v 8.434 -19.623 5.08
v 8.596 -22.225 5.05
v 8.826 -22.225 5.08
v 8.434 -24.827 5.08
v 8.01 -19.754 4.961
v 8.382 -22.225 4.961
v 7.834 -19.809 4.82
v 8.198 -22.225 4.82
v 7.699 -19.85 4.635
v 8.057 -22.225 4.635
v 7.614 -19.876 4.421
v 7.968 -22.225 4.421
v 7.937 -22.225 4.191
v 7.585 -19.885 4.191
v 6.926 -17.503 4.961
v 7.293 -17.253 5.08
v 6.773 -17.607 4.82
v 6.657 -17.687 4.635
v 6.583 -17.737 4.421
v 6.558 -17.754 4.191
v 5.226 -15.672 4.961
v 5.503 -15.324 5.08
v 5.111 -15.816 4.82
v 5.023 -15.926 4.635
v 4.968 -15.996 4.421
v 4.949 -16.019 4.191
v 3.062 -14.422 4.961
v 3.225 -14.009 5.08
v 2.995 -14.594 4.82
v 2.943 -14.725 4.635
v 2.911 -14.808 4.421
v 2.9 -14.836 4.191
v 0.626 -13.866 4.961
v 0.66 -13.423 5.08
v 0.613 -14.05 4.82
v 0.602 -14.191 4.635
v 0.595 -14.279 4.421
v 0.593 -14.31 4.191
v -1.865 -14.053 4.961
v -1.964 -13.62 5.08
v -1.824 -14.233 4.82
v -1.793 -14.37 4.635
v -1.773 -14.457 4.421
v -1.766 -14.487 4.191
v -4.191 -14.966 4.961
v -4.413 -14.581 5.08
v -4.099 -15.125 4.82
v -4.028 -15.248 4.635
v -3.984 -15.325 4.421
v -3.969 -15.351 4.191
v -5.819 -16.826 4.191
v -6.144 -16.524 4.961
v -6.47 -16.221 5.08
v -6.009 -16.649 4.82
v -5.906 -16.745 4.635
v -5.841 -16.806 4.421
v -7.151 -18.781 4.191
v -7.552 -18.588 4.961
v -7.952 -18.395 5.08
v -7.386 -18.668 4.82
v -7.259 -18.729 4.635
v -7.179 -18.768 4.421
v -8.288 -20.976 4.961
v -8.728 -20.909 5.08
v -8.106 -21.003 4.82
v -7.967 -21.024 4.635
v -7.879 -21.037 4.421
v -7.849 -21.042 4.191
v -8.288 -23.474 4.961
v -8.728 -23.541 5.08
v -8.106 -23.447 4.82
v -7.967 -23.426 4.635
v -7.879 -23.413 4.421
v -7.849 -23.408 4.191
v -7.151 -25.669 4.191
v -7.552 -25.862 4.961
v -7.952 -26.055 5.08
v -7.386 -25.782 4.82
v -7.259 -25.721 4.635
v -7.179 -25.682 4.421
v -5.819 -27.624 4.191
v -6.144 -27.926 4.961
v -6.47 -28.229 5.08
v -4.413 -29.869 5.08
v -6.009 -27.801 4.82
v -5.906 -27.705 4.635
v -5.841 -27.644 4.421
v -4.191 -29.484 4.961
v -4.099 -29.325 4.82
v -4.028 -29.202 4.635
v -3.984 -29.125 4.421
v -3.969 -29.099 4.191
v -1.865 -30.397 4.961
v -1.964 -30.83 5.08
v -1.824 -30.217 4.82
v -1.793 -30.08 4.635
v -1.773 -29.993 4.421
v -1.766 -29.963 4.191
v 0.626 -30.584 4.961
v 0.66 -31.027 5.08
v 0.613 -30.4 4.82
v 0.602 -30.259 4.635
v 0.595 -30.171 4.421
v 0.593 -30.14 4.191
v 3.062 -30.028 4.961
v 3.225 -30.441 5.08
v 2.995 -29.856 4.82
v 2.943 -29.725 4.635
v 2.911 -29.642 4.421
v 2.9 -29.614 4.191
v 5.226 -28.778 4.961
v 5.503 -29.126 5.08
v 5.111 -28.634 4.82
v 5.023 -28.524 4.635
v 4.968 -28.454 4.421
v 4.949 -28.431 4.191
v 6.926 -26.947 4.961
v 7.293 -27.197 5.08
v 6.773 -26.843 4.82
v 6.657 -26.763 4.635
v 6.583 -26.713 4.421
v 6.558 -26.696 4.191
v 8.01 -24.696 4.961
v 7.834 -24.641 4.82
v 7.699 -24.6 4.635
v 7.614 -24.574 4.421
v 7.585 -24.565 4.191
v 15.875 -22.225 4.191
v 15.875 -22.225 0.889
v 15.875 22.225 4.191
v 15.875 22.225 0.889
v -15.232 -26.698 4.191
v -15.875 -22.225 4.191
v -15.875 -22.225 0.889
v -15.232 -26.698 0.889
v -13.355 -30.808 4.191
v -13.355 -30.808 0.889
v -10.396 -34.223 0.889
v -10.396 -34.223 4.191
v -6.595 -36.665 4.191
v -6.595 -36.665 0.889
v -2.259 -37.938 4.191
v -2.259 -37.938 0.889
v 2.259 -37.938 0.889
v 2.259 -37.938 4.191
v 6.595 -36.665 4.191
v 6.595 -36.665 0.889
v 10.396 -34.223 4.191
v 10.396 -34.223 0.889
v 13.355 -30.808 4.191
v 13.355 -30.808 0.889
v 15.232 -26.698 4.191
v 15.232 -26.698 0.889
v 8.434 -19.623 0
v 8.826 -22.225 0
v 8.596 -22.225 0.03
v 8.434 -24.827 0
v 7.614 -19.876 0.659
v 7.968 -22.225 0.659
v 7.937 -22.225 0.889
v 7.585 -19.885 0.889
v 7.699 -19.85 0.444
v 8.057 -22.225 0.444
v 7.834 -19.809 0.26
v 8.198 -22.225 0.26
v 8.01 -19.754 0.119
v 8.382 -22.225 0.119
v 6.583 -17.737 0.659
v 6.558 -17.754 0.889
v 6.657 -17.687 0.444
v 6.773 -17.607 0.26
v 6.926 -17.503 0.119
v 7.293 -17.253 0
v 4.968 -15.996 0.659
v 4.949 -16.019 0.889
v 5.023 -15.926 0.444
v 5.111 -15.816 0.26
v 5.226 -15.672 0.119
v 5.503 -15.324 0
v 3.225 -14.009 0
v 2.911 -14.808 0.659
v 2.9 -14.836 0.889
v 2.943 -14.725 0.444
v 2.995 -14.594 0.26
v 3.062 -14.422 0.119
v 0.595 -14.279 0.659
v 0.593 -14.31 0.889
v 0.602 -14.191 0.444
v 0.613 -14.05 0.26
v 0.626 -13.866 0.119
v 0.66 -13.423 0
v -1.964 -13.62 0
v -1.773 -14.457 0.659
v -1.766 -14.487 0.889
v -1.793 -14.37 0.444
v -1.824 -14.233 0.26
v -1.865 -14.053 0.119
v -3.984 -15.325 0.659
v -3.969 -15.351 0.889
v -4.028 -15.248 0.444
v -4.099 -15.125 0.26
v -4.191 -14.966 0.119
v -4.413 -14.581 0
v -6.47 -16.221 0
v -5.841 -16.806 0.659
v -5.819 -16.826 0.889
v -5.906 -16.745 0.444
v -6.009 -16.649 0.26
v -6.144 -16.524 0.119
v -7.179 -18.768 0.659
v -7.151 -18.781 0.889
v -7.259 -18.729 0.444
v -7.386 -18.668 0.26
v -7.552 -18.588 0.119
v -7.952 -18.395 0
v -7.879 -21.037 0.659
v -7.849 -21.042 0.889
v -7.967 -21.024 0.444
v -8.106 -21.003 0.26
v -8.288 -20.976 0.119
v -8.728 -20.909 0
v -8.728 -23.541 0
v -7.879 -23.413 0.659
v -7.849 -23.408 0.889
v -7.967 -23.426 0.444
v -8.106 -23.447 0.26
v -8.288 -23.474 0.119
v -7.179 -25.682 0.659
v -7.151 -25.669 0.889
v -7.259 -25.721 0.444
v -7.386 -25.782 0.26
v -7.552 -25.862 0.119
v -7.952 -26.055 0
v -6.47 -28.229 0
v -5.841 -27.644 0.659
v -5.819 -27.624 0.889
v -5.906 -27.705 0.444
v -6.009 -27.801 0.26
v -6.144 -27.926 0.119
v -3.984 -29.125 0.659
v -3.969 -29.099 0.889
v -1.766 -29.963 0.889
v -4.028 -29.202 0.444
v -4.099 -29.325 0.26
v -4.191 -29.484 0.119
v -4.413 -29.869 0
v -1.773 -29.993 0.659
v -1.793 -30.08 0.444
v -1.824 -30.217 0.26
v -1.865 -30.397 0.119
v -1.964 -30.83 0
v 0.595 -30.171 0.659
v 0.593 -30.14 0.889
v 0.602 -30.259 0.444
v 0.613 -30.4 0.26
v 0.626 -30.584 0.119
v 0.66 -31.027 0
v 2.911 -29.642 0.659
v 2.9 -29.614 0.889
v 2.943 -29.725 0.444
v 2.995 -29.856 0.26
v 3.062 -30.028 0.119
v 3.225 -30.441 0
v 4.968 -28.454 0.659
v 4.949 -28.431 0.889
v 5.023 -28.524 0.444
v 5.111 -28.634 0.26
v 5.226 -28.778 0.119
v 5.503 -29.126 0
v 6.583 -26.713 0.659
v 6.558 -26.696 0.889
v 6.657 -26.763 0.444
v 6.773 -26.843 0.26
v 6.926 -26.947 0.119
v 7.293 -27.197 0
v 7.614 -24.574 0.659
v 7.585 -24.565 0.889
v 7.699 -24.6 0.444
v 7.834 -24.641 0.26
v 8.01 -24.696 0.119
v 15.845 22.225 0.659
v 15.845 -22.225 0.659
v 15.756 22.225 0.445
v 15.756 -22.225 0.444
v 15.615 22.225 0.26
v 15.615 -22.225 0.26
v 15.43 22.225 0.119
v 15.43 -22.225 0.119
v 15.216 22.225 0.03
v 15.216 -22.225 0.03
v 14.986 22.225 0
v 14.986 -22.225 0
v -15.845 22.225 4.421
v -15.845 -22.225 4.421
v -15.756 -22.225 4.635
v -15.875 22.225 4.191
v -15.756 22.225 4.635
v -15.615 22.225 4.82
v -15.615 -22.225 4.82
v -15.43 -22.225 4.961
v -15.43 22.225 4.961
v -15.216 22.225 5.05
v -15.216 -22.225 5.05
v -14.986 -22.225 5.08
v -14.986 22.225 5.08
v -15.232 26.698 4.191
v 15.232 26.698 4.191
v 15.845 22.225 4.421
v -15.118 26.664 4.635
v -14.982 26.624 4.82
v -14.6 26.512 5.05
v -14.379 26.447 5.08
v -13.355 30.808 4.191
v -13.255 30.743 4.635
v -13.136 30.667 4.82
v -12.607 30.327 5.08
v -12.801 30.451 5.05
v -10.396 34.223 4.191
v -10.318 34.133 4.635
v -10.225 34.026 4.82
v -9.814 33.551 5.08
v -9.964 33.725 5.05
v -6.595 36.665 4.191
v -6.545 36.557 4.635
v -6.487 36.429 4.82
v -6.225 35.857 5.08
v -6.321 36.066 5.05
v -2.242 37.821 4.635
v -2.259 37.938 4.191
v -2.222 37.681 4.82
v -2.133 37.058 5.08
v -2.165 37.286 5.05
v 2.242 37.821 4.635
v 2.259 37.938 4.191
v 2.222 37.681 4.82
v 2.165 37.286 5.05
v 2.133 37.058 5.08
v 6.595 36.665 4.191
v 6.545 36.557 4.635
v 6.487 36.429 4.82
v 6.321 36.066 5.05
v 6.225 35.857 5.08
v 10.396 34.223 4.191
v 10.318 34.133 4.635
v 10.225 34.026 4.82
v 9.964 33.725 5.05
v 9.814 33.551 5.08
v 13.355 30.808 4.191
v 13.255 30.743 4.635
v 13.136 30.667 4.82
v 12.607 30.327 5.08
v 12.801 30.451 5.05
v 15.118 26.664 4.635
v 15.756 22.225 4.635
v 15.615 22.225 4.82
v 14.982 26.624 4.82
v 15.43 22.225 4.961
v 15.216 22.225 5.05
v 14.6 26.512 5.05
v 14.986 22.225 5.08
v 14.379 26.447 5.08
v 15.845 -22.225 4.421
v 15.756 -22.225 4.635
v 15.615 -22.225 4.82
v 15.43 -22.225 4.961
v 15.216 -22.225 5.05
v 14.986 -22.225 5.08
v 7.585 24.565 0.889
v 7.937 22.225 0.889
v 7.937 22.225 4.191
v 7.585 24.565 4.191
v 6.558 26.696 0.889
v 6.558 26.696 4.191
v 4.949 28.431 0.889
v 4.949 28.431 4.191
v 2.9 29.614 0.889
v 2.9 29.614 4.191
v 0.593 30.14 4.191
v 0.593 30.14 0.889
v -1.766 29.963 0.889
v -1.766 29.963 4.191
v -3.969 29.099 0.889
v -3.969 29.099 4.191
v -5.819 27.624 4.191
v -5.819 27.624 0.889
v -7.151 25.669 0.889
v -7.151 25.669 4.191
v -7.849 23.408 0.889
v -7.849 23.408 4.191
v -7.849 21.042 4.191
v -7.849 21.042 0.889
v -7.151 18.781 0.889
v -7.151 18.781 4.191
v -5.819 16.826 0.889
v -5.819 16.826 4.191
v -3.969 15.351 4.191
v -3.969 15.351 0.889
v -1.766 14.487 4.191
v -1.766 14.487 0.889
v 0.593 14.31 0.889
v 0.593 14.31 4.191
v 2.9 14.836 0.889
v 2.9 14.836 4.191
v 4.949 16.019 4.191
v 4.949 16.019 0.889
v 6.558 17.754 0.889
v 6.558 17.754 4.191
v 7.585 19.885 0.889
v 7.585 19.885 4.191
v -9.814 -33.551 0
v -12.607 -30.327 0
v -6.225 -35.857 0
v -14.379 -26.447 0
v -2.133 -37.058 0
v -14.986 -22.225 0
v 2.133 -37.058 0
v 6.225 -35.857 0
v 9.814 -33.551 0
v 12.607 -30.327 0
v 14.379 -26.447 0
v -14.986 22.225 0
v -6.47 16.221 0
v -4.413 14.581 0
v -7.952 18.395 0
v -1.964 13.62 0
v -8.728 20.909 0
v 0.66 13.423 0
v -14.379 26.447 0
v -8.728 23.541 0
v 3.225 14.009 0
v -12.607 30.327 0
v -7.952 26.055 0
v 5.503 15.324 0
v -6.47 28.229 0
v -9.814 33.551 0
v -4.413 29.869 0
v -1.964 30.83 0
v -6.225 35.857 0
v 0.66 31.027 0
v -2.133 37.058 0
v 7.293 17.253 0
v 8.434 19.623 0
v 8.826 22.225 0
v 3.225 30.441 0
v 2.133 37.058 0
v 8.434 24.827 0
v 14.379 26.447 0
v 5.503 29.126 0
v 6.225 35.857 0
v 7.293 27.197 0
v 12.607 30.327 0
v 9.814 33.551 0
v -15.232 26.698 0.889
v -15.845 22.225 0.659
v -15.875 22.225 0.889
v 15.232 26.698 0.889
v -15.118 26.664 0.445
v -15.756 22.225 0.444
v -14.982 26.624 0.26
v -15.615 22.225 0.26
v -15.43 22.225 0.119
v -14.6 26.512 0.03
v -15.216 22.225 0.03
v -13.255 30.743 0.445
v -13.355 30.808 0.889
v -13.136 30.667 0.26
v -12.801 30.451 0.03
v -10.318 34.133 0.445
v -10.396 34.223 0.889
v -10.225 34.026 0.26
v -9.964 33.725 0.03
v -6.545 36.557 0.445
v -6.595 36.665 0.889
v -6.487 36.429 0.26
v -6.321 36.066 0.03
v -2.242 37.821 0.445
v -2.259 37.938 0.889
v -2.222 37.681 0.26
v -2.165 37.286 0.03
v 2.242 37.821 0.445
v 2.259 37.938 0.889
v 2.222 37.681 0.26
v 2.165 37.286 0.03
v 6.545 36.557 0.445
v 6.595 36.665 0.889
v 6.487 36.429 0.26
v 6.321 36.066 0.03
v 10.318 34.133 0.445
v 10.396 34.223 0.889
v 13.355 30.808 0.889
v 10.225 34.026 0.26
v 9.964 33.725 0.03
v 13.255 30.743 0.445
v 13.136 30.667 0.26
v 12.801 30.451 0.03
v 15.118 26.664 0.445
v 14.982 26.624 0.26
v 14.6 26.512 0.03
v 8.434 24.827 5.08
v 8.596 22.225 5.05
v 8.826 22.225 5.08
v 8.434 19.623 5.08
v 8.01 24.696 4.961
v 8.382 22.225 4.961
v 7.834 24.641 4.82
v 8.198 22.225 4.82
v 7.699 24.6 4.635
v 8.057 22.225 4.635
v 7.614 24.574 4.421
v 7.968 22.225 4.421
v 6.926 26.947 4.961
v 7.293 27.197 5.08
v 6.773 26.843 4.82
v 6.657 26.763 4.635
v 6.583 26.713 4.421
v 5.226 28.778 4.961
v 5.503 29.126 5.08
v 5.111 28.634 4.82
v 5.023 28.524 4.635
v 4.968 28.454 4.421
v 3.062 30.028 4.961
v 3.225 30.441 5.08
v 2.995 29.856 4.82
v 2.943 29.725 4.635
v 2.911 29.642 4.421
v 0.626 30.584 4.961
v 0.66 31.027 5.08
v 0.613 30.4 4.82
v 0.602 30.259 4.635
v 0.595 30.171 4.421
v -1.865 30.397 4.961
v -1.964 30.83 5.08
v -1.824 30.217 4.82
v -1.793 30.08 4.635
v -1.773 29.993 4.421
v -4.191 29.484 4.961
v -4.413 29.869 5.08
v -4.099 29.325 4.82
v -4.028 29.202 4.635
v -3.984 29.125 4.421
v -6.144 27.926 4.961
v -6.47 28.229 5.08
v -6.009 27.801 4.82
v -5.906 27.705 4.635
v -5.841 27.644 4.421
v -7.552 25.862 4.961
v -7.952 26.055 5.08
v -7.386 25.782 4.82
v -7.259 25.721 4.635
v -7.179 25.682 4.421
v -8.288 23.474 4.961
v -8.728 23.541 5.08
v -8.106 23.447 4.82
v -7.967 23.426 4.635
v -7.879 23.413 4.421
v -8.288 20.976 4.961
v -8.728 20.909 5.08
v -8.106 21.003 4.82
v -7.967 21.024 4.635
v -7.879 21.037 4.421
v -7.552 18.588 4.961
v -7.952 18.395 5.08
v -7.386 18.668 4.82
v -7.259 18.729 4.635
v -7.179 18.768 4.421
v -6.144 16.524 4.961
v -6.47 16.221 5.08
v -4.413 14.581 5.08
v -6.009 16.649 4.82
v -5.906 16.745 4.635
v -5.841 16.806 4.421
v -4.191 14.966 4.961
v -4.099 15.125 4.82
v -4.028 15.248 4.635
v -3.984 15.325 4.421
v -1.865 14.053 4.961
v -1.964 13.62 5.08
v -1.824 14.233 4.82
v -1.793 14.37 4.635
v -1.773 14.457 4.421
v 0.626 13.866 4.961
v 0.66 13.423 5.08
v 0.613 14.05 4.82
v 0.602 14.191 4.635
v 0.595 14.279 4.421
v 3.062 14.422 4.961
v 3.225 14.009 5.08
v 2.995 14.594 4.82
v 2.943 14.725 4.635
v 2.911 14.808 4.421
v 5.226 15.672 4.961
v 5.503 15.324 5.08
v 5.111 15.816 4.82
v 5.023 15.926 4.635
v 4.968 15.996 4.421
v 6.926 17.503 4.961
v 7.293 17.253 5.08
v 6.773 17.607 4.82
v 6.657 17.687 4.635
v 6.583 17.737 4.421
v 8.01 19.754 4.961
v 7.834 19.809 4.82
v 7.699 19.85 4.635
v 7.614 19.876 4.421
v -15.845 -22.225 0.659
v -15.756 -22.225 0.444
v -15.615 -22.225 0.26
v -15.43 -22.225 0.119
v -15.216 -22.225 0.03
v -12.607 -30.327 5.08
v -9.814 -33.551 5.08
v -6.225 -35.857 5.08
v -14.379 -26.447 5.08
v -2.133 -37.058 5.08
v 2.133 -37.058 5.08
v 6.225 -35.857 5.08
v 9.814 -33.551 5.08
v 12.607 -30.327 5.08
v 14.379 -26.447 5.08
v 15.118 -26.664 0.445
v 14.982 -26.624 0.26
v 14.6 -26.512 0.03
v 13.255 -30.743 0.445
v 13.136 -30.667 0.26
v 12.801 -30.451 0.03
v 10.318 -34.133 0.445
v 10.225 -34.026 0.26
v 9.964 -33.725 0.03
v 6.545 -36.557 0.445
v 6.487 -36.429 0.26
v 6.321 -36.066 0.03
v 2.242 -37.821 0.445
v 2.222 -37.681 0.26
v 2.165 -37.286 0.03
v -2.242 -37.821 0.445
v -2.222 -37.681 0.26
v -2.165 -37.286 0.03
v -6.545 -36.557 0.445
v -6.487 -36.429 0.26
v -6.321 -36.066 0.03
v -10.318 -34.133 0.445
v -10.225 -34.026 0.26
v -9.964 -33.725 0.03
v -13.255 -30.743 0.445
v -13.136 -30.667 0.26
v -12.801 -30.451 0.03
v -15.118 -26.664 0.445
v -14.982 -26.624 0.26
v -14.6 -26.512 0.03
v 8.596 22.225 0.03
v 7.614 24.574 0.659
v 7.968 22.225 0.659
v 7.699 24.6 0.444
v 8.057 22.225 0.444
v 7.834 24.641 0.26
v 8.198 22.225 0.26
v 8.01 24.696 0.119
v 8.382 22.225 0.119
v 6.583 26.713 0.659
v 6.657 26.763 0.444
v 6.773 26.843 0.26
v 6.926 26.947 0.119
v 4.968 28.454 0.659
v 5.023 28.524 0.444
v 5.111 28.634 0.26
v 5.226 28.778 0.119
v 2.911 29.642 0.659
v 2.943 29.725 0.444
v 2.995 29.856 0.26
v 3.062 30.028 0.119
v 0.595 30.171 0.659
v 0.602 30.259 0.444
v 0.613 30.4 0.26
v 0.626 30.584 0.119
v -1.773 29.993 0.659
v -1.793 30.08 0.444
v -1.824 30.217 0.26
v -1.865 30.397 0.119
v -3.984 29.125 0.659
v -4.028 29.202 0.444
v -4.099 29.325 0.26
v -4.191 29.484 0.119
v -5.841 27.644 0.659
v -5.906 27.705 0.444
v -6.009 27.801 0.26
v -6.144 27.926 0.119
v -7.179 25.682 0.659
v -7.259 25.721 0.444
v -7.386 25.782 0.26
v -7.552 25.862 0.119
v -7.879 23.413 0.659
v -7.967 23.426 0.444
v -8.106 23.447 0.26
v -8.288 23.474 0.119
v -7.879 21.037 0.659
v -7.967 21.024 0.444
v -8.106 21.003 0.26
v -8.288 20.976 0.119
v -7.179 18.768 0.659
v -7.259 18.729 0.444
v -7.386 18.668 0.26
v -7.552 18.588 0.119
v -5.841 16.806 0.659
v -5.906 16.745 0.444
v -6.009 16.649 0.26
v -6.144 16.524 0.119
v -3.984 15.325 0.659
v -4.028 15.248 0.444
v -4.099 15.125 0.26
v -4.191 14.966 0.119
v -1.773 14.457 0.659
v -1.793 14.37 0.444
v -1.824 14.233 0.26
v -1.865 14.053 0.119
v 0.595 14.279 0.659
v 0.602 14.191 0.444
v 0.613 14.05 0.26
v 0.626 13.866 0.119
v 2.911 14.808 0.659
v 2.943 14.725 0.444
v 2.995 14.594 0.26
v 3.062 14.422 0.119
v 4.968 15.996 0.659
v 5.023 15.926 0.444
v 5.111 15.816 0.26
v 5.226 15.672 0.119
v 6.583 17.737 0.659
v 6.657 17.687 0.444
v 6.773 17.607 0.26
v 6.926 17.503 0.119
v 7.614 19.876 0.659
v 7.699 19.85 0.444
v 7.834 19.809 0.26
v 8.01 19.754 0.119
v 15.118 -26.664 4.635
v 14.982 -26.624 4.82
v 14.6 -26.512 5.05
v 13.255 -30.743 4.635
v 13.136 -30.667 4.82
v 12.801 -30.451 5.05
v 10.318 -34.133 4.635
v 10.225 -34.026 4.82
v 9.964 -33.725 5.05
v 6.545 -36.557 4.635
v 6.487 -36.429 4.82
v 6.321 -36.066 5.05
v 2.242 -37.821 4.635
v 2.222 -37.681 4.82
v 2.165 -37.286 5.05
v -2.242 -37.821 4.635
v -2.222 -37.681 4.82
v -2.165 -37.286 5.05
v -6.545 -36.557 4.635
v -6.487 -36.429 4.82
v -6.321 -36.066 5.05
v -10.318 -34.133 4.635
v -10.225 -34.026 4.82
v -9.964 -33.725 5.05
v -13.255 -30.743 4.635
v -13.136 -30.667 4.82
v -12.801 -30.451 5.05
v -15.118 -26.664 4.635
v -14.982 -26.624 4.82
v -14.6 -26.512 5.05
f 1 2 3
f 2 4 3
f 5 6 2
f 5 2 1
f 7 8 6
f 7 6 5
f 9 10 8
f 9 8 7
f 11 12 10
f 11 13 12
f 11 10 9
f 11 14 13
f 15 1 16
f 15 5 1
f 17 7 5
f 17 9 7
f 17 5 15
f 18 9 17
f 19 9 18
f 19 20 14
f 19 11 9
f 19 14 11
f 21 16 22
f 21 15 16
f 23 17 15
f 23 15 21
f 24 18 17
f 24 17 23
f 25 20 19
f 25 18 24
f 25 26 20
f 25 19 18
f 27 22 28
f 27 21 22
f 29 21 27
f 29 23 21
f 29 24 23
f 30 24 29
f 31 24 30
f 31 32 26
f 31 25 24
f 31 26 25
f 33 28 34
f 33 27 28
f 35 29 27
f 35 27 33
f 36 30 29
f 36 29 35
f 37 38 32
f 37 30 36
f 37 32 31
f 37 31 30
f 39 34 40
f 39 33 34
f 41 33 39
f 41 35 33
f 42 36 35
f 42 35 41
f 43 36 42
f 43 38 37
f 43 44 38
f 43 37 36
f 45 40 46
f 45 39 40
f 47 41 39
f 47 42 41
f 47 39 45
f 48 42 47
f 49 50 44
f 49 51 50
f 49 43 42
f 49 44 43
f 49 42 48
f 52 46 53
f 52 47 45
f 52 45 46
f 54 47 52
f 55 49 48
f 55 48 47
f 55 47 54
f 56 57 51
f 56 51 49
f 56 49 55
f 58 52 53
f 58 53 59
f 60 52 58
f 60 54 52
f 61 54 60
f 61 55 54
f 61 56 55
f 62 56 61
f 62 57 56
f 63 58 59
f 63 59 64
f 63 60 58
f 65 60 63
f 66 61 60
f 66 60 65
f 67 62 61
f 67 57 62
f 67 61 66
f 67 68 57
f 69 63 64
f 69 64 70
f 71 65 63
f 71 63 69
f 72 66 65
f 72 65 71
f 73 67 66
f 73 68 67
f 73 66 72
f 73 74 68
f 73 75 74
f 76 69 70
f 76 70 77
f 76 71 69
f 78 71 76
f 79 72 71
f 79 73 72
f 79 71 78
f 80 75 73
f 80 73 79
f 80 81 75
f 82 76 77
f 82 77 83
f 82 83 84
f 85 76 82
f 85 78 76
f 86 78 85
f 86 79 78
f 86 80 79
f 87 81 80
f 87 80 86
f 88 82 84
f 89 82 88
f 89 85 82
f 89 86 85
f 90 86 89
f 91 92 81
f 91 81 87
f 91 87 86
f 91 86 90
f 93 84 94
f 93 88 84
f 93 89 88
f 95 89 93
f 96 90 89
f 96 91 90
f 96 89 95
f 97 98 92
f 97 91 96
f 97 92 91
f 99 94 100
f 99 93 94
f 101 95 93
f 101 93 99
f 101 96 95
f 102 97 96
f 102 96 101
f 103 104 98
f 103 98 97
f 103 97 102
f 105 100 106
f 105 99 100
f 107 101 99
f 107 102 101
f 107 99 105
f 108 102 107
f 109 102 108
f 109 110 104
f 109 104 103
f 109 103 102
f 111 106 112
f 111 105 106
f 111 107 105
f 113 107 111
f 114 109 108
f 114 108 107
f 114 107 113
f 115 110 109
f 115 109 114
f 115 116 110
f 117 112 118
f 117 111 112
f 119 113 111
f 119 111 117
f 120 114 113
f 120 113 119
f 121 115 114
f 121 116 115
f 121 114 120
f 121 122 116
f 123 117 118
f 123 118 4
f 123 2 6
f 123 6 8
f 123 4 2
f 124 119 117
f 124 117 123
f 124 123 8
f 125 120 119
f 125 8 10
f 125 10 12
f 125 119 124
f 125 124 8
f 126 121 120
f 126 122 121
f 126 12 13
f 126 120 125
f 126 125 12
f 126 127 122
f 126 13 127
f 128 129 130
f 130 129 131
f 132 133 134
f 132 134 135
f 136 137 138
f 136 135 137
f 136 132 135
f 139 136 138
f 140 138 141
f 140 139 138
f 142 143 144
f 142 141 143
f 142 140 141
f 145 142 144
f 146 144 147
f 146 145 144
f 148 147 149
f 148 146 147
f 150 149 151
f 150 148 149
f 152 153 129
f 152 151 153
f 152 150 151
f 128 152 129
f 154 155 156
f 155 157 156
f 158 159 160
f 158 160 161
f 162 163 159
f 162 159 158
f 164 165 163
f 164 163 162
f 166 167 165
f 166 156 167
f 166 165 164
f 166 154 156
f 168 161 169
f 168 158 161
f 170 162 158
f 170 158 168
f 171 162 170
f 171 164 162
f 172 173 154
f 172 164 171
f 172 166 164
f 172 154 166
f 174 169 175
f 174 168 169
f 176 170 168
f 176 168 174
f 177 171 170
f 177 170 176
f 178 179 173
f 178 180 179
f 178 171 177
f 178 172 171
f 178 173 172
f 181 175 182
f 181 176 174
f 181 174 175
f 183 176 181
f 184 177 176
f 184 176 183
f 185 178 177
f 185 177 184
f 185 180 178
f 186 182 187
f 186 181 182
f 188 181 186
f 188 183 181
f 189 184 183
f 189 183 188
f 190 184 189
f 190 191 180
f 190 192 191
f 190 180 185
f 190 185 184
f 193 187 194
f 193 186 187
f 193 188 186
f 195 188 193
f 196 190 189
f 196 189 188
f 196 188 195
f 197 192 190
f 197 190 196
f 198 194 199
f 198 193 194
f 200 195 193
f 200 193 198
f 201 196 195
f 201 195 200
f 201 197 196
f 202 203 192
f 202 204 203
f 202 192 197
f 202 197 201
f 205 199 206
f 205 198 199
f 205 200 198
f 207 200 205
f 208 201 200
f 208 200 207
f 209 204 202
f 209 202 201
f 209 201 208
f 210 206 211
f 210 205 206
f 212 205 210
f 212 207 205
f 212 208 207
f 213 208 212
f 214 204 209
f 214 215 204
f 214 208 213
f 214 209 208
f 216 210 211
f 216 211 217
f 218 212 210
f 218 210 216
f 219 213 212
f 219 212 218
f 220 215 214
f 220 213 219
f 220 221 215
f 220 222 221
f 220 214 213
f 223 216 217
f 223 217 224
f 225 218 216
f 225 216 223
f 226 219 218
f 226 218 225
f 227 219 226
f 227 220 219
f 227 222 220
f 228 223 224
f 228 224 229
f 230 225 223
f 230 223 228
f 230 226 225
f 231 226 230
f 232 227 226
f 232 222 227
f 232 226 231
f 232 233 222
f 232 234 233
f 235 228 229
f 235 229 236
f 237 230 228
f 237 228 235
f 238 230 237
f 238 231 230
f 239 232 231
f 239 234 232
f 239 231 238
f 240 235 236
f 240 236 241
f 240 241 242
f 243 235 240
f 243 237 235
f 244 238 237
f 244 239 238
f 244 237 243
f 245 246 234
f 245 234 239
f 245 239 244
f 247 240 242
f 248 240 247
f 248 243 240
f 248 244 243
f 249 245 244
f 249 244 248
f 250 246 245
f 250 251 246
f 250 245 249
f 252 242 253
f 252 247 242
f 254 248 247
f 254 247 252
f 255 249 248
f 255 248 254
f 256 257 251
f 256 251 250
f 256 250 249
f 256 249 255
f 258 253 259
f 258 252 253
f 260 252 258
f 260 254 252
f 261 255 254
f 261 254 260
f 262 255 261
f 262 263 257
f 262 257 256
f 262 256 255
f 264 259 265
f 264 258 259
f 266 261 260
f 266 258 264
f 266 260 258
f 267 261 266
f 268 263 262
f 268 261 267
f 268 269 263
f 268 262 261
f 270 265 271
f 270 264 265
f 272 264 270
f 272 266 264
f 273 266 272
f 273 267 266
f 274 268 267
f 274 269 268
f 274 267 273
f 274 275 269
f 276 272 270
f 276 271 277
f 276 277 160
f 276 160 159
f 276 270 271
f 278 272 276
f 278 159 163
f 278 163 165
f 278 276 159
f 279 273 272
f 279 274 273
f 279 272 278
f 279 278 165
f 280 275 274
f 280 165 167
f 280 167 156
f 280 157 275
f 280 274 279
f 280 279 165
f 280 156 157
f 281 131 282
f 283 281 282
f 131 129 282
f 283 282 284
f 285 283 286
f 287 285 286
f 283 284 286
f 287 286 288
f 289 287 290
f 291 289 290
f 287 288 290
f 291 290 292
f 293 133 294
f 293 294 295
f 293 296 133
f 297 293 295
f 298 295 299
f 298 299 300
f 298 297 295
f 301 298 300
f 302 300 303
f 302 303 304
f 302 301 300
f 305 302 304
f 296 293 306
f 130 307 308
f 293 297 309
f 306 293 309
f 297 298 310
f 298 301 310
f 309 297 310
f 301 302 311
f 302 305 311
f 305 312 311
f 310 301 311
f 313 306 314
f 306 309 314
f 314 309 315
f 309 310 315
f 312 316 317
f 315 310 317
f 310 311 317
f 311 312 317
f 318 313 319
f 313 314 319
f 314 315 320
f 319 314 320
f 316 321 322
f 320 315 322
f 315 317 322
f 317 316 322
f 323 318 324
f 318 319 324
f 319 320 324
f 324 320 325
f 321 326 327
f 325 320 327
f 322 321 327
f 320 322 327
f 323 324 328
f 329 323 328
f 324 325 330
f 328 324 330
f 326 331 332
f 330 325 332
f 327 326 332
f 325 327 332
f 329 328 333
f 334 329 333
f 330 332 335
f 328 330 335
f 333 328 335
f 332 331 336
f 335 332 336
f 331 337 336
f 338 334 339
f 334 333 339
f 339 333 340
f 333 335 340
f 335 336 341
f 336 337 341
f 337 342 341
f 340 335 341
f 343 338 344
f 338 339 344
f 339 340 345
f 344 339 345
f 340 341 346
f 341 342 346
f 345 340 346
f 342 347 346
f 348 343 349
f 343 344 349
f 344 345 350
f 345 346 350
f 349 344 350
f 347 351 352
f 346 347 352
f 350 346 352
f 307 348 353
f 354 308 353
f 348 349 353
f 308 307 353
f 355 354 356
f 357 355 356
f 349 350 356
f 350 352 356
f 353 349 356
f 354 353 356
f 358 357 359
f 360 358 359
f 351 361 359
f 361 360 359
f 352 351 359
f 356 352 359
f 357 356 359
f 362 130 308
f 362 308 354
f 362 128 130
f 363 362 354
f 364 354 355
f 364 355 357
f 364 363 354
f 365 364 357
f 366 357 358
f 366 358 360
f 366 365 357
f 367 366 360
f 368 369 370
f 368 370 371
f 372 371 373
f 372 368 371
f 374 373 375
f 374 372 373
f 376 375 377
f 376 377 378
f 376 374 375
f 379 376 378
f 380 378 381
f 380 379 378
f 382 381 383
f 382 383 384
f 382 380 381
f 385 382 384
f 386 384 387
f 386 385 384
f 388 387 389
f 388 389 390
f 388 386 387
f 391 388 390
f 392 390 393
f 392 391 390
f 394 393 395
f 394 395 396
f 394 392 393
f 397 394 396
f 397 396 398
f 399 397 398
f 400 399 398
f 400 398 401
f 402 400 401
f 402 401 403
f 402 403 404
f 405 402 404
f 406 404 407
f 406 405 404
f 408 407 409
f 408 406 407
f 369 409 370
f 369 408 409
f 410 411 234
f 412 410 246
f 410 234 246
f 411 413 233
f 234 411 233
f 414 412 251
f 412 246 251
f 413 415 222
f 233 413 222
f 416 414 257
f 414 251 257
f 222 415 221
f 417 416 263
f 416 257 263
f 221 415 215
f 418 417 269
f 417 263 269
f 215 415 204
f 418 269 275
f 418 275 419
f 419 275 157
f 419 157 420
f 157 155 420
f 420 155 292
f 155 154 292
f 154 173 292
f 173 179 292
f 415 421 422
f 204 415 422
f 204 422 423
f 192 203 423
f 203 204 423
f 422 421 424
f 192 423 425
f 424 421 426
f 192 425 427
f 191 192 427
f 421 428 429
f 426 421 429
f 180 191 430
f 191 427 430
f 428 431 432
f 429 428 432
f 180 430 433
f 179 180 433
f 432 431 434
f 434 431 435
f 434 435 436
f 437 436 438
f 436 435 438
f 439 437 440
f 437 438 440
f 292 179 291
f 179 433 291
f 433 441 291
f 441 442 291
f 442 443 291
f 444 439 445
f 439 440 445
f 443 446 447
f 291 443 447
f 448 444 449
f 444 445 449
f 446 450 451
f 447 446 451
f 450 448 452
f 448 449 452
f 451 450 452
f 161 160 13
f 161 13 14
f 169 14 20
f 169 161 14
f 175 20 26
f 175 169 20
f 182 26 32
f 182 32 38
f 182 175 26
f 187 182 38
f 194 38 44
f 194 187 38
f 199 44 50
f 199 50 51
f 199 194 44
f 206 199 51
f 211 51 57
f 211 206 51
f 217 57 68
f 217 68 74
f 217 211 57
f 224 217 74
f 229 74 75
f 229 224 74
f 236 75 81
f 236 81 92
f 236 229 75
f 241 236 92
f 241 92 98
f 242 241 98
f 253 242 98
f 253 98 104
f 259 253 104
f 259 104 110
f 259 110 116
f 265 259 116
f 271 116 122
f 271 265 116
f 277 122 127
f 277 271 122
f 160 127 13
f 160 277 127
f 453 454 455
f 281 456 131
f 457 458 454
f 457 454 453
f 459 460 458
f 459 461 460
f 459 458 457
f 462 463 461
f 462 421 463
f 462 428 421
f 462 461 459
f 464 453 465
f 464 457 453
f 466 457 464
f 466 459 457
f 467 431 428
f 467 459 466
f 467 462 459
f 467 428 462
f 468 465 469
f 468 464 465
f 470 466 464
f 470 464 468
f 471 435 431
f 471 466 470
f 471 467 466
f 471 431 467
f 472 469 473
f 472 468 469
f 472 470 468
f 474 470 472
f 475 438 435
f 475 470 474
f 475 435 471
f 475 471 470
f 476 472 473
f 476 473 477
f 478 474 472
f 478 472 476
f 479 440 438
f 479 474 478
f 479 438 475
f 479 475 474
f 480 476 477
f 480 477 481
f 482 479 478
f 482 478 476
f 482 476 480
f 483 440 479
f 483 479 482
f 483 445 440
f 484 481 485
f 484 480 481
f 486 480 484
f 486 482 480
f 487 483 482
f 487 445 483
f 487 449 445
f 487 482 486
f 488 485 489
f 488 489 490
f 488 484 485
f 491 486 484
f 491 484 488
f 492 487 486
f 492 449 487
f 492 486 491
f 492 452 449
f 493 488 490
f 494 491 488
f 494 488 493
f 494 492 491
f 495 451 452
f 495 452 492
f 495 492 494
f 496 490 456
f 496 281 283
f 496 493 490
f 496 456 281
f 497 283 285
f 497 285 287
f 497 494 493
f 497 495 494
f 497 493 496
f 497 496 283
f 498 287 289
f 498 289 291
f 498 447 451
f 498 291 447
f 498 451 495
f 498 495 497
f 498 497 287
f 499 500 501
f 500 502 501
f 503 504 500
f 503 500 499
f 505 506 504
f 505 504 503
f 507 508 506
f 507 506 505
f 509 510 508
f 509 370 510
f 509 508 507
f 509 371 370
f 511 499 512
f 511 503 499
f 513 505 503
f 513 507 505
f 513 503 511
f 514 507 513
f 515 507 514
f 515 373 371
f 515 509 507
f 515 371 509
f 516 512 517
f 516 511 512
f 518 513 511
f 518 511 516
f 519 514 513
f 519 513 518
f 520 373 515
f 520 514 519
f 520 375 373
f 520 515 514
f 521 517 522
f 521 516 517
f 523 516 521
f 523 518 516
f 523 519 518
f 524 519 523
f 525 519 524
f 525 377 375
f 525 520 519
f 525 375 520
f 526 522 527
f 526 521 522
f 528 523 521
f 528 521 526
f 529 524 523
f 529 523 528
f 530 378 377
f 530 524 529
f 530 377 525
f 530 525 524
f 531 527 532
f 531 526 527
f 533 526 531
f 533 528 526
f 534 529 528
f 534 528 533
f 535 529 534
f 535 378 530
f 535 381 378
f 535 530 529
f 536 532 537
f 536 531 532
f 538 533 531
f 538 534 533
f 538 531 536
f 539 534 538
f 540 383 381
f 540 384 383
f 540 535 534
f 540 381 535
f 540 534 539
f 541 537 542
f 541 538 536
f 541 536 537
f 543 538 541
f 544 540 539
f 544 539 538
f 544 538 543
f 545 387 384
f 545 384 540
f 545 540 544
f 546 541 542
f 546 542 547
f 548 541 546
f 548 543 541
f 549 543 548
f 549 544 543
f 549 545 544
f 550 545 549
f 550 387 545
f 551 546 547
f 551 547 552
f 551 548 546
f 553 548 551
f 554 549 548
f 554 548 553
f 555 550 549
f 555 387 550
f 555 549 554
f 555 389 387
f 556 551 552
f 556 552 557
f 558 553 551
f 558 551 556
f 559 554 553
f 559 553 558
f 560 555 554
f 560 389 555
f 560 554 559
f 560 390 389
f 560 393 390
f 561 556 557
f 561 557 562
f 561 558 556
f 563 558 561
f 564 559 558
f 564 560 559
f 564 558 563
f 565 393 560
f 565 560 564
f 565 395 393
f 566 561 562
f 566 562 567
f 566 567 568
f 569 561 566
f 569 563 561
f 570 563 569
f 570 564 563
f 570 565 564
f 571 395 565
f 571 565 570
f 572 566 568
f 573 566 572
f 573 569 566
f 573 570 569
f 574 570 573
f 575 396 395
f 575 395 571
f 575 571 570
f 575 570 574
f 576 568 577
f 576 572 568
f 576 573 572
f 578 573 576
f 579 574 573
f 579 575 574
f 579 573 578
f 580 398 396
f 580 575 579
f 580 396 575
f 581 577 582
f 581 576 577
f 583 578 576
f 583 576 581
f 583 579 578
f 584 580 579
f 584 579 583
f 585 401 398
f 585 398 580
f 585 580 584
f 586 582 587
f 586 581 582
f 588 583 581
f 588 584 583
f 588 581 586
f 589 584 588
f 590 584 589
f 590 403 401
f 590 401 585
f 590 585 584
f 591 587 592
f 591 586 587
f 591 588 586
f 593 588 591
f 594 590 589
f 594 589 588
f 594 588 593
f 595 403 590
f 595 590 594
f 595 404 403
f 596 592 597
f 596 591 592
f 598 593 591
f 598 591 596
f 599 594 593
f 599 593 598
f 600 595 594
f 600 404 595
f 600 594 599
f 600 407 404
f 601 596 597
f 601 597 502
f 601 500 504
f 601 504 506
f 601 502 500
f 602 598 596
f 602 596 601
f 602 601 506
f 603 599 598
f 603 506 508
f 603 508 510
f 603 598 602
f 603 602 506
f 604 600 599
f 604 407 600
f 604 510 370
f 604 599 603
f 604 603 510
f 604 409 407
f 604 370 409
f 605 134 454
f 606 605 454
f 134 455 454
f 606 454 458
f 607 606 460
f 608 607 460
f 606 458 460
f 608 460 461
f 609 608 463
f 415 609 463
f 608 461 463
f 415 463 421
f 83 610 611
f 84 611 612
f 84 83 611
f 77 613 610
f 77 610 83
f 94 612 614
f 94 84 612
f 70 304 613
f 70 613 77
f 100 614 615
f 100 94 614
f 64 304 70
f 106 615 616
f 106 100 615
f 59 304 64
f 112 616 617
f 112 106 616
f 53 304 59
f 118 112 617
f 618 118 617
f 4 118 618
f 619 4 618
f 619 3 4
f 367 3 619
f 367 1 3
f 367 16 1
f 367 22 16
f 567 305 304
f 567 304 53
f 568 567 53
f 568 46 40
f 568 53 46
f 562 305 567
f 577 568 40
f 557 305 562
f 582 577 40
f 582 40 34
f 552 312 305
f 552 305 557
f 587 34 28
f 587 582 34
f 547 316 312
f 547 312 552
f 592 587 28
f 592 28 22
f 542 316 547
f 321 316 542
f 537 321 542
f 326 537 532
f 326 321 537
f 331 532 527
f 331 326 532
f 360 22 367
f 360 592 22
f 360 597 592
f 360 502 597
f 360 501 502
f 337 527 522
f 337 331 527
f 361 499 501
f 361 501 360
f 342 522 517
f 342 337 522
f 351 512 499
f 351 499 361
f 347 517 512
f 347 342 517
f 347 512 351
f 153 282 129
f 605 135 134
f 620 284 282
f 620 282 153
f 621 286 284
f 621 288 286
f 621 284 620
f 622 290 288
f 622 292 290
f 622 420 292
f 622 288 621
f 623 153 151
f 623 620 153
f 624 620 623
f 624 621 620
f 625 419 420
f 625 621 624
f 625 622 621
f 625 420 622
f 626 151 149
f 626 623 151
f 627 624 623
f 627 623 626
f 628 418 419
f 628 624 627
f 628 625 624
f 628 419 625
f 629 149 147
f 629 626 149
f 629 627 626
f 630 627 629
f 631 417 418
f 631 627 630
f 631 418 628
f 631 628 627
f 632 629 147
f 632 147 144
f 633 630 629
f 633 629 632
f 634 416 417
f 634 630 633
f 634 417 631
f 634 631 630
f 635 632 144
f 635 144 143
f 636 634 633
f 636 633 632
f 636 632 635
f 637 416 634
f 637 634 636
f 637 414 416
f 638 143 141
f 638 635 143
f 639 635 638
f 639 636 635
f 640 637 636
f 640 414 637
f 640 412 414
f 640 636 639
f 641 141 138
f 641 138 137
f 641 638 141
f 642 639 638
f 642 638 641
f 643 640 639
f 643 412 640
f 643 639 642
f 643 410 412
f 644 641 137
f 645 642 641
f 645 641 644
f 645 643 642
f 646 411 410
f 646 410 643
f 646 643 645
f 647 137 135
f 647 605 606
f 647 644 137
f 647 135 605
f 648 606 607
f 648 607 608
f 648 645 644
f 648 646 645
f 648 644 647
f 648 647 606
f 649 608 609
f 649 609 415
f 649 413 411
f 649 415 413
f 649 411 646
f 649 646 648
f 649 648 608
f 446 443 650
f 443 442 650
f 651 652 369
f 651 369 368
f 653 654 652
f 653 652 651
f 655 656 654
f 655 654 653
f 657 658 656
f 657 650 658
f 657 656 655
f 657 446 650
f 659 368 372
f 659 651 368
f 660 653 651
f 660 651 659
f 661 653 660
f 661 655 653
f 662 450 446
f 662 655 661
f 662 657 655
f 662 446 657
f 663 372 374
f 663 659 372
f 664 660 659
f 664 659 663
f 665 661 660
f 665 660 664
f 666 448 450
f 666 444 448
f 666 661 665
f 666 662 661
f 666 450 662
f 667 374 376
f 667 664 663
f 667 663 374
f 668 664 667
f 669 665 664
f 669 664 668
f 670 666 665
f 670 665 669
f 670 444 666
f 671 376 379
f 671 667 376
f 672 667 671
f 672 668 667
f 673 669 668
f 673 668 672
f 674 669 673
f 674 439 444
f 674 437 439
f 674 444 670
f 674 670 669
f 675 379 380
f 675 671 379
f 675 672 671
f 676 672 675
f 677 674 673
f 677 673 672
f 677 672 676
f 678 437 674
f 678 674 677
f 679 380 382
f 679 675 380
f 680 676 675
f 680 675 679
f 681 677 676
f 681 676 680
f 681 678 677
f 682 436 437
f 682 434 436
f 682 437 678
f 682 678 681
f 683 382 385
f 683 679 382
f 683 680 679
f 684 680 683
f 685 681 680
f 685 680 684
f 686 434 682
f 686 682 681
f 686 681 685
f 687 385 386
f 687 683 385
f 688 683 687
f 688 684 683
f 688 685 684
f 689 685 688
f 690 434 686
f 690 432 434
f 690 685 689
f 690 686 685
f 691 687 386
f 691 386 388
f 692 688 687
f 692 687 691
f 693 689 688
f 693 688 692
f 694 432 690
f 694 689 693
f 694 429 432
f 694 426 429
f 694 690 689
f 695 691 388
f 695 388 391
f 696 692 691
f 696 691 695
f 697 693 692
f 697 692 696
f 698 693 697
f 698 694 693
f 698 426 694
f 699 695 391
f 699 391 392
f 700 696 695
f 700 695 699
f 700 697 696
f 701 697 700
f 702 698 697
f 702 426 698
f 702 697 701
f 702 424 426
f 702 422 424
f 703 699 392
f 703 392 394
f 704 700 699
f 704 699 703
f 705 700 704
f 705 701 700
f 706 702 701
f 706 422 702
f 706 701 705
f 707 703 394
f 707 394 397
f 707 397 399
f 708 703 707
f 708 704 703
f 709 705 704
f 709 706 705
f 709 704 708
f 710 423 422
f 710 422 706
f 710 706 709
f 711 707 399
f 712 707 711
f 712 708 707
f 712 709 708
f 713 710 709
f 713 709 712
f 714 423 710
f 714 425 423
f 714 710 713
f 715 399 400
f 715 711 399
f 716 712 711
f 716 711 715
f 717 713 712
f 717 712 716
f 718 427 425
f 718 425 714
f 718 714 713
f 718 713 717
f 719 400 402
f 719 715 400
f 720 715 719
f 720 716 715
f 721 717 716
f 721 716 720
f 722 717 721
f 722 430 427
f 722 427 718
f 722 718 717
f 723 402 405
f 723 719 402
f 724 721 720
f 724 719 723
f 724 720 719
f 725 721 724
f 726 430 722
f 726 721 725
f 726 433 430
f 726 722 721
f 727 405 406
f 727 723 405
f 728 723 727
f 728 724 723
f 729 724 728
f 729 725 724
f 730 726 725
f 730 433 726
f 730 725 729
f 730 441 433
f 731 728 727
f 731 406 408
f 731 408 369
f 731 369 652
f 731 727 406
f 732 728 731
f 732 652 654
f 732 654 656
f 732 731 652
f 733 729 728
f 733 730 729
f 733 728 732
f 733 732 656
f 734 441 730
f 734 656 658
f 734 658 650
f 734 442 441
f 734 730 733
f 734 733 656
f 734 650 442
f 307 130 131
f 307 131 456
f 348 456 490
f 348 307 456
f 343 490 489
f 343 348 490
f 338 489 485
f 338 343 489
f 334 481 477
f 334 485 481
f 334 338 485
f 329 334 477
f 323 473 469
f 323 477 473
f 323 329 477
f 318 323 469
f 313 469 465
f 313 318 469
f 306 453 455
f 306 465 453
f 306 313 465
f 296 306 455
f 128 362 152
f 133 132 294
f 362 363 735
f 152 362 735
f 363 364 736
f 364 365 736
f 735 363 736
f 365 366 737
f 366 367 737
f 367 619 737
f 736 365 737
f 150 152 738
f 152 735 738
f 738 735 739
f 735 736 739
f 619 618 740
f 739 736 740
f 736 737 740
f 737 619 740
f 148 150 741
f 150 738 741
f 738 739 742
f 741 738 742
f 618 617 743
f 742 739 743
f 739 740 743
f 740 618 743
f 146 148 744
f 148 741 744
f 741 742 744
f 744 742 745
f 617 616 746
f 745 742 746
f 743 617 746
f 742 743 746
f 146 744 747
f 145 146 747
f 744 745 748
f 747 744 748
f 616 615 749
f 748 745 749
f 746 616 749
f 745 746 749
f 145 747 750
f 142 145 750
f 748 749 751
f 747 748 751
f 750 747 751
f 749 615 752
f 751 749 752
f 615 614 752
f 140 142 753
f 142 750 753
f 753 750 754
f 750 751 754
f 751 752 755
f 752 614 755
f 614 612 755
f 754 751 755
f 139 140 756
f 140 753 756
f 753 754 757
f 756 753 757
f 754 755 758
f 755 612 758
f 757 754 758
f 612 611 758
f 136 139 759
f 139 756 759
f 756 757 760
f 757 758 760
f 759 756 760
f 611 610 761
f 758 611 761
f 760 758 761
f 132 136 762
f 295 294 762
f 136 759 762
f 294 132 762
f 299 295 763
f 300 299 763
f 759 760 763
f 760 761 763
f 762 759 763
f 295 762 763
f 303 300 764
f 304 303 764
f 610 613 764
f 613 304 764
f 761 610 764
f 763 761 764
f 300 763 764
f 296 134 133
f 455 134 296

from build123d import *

# Parameters (mm, degrees)
SKETCH1_W           = 31.75
SKETCH1_H           = 76.2
SKETCH1_R           = 7.9375
BOSS_EXTRUDE1_DEPTH = 5.08
FILLET1_RADIUS      = 15.875
FILLET1_LENGTH      = 5.08
FILLET2_RADIUS      = 15.875
FILLET2_LENGTH      = 5.08
FILLET3_R           = 0.889


with BuildPart() as part:
    # Sketch1 → Boss-Extrude1 (new body)
    with BuildSketch(Plane.XY):
        Rectangle(SKETCH1_W, SKETCH1_H)
        with Locations((0, 22.225)):
            Circle(SKETCH1_R, mode=Mode.SUBTRACT)
        with Locations((0, -22.225)):
            Circle(SKETCH1_R, mode=Mode.SUBTRACT)
    extrude(amount=BOSS_EXTRUDE1_DEPTH)

    # Fillet1: full round fillet: the end face becomes a half cylinder, R = half its width
    fillet1_face = Plane((0, 38.1, 2.54), x_dir=(0, 0, 1), z_dir=(0, 1, 0))  # on the end face: x along it, z out of the body
    fillet1_slab = fillet1_face.offset(-FILLET1_RADIUS / 2) * Box(FILLET1_LENGTH, 2 * FILLET1_RADIUS, FILLET1_RADIUS, mode=Mode.PRIVATE)  # the body's end, R deep
    fillet1_round = Plane((0, 22.225, 2.54), x_dir=(0, 1, 0), z_dir=(0, 0, 1)) * Cylinder(FILLET1_RADIUS, FILLET1_LENGTH, mode=Mode.PRIVATE)  # its axis R under the face
    add(fillet1_slab - fillet1_round, mode=Mode.SUBTRACT)

    # Fillet2: full round fillet: the end face becomes a half cylinder, R = half its width
    fillet2_face = Plane((0, -38.1, 2.54), x_dir=(0, 0, 1), z_dir=(0, -1, 0))  # on the end face: x along it, z out of the body
    fillet2_slab = fillet2_face.offset(-FILLET2_RADIUS / 2) * Box(FILLET2_LENGTH, 2 * FILLET2_RADIUS, FILLET2_RADIUS, mode=Mode.PRIVATE)  # the body's end, R deep
    fillet2_round = Plane((0, -22.225, 2.54), x_dir=(0, -1, 0), z_dir=(0, 0, 1)) * Cylinder(FILLET2_RADIUS, FILLET2_LENGTH, mode=Mode.PRIVATE)  # its axis R under the face
    add(fillet2_slab - fillet2_round, mode=Mode.SUBTRACT)

    # Fillet3
    fillet3_edges = [part.edges().sort_by_distance(p)[0] for p in [
        (-7.9375, 22.225, 0),
        (-7.9375, 22.225, 5.08),
        (-7.9375, -22.225, 0),
        (-7.9375, -22.225, 5.08),
        (-15.875, 0, 0),
        (-15.875, 0, 5.08),
        (0, 38.1, 0),
        (0, 38.1, 5.08),
        (15.875, 0, 0),
        (15.875, 0, 5.08),
        (0, -38.1, 0),
        (0, -38.1, 5.08),
    ]]
    fillet(fillet3_edges, radius=FILLET3_R)


solid = part.part
